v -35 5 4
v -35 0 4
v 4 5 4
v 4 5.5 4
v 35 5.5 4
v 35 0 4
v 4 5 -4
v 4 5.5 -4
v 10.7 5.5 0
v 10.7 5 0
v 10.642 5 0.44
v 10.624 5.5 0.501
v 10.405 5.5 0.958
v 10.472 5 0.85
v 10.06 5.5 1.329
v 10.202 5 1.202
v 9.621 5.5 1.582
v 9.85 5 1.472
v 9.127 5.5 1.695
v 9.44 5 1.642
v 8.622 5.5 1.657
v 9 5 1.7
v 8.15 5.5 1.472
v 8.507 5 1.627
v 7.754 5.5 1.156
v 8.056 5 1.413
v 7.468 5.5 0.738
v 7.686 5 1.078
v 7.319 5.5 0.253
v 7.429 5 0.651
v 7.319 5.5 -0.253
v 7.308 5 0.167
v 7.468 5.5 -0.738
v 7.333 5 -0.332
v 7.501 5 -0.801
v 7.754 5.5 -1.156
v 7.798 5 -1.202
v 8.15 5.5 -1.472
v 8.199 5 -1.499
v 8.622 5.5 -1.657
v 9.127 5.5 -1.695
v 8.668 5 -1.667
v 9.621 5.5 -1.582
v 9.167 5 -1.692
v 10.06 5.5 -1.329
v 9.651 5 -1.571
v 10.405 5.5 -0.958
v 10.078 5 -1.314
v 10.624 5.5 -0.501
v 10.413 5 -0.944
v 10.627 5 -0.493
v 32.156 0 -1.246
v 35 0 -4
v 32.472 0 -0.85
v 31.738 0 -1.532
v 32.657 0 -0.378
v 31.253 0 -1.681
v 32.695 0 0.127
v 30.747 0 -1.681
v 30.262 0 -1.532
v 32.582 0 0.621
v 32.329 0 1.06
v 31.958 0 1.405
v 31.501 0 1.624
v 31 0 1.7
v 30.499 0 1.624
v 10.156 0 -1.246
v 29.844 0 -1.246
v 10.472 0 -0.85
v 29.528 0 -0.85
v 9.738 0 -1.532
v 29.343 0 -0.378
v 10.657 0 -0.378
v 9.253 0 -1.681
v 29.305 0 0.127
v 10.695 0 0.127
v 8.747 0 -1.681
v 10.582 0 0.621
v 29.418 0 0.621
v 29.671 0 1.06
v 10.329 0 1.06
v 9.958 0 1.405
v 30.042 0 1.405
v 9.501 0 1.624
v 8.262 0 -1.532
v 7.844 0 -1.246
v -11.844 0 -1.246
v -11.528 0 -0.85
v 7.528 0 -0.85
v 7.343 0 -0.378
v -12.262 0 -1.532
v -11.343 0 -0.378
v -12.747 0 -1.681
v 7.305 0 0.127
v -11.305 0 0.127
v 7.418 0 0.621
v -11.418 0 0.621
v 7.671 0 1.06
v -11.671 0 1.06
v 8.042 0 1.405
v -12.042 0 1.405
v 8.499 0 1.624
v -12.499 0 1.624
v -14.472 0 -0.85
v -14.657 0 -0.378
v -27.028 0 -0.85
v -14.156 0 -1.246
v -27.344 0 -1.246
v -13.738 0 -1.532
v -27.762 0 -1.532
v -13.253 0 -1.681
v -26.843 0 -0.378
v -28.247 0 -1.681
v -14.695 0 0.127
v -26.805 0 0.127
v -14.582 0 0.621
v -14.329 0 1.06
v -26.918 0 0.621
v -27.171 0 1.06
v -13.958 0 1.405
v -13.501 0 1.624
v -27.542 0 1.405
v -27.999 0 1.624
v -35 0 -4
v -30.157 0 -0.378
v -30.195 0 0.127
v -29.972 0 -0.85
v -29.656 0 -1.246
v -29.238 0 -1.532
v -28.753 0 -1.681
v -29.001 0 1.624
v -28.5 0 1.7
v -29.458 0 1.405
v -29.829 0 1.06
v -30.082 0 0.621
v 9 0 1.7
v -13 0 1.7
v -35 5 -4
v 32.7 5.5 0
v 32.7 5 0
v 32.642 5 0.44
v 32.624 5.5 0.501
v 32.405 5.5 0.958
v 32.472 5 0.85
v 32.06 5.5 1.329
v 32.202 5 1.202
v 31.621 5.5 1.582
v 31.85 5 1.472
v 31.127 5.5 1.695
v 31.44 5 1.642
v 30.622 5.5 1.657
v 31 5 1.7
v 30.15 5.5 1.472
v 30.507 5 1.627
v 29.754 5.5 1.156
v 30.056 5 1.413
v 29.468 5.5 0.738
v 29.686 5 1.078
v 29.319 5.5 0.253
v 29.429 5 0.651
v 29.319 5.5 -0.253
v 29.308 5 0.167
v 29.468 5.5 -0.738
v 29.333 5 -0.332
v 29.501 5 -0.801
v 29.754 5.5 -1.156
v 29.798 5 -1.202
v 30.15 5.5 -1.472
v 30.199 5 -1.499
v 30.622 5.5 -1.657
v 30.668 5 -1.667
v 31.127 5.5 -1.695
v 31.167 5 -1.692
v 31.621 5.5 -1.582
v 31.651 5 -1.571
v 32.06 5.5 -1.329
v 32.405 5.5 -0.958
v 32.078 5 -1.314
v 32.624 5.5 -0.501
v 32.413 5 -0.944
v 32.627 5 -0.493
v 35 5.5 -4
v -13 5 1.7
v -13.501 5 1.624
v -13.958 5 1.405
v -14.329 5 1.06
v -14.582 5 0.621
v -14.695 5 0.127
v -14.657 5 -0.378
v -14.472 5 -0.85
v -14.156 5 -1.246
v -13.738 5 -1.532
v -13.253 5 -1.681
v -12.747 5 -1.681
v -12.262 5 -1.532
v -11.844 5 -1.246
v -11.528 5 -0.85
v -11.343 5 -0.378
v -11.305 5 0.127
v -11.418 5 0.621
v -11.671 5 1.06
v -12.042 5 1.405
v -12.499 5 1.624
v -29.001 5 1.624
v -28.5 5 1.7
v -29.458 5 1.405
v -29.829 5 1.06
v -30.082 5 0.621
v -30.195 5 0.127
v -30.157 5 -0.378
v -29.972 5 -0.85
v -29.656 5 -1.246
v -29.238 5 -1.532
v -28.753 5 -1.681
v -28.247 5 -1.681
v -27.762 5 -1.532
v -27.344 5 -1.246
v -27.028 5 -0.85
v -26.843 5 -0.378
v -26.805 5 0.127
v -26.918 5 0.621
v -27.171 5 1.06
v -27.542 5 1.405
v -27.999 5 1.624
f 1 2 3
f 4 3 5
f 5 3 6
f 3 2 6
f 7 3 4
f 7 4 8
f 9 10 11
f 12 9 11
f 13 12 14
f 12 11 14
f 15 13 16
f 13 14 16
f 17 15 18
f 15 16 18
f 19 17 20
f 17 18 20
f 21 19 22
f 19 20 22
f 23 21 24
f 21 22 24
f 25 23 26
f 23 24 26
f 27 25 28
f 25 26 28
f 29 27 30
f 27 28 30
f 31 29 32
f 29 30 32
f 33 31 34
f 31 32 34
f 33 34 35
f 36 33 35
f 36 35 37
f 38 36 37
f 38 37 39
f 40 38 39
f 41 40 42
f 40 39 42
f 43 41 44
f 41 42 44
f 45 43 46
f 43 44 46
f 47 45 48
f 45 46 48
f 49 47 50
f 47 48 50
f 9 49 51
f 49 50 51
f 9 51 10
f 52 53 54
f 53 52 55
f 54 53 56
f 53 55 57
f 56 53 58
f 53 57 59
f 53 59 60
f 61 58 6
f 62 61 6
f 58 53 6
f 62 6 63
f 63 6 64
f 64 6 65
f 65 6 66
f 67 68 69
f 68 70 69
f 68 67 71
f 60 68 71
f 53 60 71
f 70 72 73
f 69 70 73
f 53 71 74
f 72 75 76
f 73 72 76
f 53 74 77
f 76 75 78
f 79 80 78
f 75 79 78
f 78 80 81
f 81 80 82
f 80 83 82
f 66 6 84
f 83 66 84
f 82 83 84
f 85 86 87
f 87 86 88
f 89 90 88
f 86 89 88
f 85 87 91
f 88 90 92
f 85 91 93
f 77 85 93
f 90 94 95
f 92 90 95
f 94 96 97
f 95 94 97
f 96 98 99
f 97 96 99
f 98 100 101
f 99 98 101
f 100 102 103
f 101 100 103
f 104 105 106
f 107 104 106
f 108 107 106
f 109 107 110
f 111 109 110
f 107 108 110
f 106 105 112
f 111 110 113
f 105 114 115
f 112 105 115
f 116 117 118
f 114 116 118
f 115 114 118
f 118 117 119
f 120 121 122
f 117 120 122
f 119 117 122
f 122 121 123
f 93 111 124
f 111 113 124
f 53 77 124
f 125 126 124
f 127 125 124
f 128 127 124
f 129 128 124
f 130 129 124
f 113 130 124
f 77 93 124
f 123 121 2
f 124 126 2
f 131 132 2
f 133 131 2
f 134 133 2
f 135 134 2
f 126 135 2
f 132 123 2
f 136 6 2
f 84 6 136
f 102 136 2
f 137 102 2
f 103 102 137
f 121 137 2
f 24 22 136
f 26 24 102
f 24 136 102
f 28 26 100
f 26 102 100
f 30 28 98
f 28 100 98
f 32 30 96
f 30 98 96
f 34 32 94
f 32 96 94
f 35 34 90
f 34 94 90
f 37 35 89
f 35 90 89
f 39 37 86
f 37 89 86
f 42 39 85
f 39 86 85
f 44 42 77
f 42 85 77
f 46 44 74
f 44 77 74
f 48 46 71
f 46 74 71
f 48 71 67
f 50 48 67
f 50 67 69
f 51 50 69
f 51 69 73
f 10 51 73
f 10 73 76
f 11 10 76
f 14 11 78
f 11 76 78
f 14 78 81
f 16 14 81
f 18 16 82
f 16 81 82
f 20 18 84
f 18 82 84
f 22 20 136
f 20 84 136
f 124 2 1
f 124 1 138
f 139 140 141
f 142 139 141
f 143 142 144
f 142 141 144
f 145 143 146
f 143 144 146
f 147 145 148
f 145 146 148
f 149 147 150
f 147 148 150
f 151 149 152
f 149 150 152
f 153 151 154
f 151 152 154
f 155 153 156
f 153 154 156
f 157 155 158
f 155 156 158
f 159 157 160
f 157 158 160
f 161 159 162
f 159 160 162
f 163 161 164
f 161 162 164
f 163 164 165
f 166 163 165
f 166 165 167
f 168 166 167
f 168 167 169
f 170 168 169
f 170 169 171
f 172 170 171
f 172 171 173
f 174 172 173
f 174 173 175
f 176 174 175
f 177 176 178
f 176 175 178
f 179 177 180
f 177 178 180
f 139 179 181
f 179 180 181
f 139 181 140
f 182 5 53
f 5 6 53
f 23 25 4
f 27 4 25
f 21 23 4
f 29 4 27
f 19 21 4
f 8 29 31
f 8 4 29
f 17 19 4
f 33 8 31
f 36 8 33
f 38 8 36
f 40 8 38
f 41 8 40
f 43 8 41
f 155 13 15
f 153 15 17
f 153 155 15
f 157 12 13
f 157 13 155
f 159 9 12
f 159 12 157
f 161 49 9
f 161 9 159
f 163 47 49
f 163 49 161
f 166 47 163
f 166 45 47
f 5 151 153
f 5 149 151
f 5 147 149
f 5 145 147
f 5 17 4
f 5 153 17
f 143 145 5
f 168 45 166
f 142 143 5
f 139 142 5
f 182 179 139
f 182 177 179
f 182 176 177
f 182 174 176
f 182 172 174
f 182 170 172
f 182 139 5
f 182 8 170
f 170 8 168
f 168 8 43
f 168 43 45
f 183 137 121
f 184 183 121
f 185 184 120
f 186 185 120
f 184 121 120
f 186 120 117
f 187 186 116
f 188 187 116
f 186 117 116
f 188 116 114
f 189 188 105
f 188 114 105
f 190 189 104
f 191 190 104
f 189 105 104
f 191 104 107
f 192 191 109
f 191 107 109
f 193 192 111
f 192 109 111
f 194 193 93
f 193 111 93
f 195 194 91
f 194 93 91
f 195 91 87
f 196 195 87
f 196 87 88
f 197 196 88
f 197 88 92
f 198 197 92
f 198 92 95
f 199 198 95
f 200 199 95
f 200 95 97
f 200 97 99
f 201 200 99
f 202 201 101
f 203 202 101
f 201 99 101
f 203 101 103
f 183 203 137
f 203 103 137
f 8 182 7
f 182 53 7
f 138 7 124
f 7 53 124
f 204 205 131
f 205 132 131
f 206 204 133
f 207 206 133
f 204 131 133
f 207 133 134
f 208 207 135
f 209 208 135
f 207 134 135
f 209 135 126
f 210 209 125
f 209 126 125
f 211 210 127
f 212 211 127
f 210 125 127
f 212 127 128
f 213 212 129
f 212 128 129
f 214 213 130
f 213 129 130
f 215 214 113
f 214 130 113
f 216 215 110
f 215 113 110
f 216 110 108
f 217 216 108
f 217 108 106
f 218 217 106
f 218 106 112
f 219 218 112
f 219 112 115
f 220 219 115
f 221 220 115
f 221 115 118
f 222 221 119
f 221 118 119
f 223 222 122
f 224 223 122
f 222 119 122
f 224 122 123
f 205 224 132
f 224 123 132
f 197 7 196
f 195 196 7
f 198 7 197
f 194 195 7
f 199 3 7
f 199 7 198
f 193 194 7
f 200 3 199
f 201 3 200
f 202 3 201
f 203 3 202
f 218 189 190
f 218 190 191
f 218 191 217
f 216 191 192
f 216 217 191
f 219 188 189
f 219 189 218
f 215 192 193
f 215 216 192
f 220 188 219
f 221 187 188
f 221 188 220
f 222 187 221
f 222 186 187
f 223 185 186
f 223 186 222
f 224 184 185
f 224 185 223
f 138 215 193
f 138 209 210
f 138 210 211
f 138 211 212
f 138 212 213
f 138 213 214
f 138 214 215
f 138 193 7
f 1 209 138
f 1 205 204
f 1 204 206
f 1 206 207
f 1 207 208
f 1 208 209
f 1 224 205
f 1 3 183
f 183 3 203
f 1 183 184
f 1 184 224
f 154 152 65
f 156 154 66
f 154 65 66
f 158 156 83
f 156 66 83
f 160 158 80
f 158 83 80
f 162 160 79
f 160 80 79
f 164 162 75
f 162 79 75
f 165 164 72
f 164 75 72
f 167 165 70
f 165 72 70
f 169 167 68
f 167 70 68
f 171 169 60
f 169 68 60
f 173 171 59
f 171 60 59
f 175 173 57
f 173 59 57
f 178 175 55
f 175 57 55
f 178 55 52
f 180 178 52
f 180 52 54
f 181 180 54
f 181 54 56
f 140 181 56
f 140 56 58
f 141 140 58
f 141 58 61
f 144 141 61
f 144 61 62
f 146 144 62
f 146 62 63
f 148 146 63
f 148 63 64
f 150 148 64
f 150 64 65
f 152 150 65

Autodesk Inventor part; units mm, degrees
ref_plane "YZ Plane" through (0, 0, 0) normal (1, 0, 0) x (0, 1, 0)
ref_plane "XZ Plane" through (0, 0, 0) normal (0, 1, 0) x (-1, 0, 0)
ref_plane "XY Plane" through (0, 0, 0) normal (0, 0, 1) x (1, 0, 0)
sketch "Skizze1" plane through (0, 0, 0) normal (0, 1, 0) x (-1, 0, 0)
  line L0 (-35, 4) -> (35, 4)
  line L1 (35, 4) -> (35, -4)
  line L2 (35, -4) -> (-35, -4)
  line L3 (-35, -4) -> (-35, 4)
  line L4 (-35, 4) -> (35, -4) construction
  line L5 (35, 4) -> (-35, -4) construction
  point P0 (0, 0)
  dimension "d0" = 70
  dimension "d1" = 8
extrude "Extrusion1" add sketch "Skizze1" along normal blind 5
sketch "Skizze2" plane through (0, 5, 0) normal (0, 1, 0) x (1, 0, 0)
  line L0 (-35, -4) -> (35, -4) projected
  line L1 (35, -4) -> (35, 4) projected
  line L2 (35, 4) -> (-35, 4) projected
  line L3 (-35, 4) -> (-35, -4) projected
  line L4 (0, 0) -> (47.4069, 0) construction
  point P0 (31, 0)
  point P1 (9, 0)
  dimension "d4" = 8
  dimension "d5" = 4
  dimension "d7" = 22
hole "Bohrung1" at (31, 5, 0) at (9, 5, 0) direction (0, -1, 0) diameter 3.4 end through all clearance for "Inbusschraube ISO 4762" size "M3" standard "ISO"
sketch "Skizze3" plane through (0, 5, 0) normal (0, 1, 0) x (1, 0, 0)
  line L0 (19.9613, 0) -> (-27.7601, 0) construction
  circle A0 centre (9, 0) radius 1.7 projected
  point P0 (0, 0)
  point P1 (-13, 0)
  point P2 (-28.5, 0)
  dimension "d15" = 22
  dimension "d16" = 15.5
hole "Bohrung2" at (-13, 5, 0) at (-28.5, 5, 0) direction (0, -1, 0) diameter 3.4 end through all clearance for "Inbusschraube ISO 4762" size "M3" standard "ISO"
sketch "Skizze4" plane through (0, 5, 0) normal (0, 1, 0) x (1, 0, 0)
  circle A0 centre (-13, 0) radius 1.7 projected
  circle A1 centre (-28.5, 0) radius 1.7 projected
  circle A2 centre (31, 0) radius 1.7 projected
  circle A3 centre (9, 0) radius 1.7 projected
  line L0 (-35, -4) -> (35, -4) projected
  line L1 (35, -4) -> (35, 4) projected
  line L2 (35, 4) -> (-35, 4) projected
  line L3 (-35, 4) -> (-35, -4) projected
  line L4 (-35, 4) -> (35, 4) projected
  line L5 (35, -4) -> (4, -4)
  line L6 (4, -4) -> (4, 4)
  line L7 (4, 4) -> (35, 4)
  line L8 (35, 4) -> (35, -4)
  point P0 (0, 0)
  dimension "d27" = 5
extrude "Extrusion2" add sketch "Skizze4" along normal blind 0.5 contours L6 L2 L1 L0
equation "\"d5\" = 0.5 * d4"
properties part number "connection_hand_camera"
